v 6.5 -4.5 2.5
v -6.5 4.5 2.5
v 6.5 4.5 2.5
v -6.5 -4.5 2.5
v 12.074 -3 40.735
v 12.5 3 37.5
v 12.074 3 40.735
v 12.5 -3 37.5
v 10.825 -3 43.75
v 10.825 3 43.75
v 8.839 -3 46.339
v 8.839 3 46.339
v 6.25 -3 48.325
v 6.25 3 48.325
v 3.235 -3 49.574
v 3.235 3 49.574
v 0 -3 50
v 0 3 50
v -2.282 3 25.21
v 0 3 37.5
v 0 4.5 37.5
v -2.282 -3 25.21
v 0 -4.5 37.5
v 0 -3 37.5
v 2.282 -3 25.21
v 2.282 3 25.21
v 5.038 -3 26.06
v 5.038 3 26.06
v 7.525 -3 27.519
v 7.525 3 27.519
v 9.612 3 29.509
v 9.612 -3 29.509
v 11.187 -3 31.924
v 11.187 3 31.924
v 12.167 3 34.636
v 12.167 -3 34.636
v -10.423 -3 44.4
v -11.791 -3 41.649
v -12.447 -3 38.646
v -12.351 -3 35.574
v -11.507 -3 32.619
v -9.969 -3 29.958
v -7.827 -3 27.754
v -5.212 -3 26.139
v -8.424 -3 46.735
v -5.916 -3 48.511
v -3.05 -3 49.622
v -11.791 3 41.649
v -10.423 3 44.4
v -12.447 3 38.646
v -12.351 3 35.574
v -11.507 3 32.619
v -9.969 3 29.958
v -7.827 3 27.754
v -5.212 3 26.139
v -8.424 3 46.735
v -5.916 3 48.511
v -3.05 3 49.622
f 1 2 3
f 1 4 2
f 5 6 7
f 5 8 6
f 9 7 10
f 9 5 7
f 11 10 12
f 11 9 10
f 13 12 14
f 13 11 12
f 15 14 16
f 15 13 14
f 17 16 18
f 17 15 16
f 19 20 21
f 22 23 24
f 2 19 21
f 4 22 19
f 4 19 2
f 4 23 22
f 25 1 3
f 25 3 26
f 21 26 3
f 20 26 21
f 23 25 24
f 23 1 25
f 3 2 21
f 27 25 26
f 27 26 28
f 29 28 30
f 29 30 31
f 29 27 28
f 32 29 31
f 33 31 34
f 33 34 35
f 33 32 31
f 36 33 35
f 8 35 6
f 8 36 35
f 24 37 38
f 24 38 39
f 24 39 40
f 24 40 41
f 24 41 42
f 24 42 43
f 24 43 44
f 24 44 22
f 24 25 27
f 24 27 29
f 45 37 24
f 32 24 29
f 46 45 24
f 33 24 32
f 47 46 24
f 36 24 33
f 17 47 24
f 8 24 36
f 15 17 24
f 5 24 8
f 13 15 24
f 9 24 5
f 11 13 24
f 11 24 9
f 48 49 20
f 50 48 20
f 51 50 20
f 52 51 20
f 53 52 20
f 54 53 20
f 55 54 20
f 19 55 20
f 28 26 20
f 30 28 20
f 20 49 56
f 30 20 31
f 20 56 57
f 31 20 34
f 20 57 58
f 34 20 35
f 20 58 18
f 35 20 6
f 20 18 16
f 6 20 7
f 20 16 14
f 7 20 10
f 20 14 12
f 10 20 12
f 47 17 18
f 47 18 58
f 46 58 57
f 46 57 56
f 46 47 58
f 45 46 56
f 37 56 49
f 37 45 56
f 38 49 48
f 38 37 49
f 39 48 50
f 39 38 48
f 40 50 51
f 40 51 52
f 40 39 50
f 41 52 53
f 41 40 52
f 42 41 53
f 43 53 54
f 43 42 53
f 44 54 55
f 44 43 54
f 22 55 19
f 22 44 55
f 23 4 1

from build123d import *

# Parameters (mm, degrees)
F1_DEPTH = 3
F3_DEPTH = 4.5


with BuildPart() as f1:
    # F0 (on Front) → F1 (new body, symmetric)
    with BuildSketch(Plane.XZ):
        with BuildLine():
            Line((0, 25), (0, 50))
            ThreePointArc((0, 50), (-12.5, 37.5), (0, 25))
        make_face()
        with BuildLine():
            ThreePointArc((0, 25), (8.838835, 28.661165), (12.5, 37.5))
            ThreePointArc((12.5, 37.5), (8.838835, 46.338835), (0, 50))
            Line((0, 50), (0, 25))
        make_face()
    extrude(amount=F1_DEPTH, both=True)

    # F2 (on Front) → F3 (join, symmetric)
    with BuildSketch(Plane.XZ):
        Polygon((6.5, 2.5), (0, 37.5), (-6.5, 2.5), align=None)
    extrude(amount=F3_DEPTH, both=True)

    # F4: F1 across plane


with BuildPart() as f1_1:
    add(f1.part)
    add(f1.part.mirror(Plane.XZ))


solid = f1_1.part
